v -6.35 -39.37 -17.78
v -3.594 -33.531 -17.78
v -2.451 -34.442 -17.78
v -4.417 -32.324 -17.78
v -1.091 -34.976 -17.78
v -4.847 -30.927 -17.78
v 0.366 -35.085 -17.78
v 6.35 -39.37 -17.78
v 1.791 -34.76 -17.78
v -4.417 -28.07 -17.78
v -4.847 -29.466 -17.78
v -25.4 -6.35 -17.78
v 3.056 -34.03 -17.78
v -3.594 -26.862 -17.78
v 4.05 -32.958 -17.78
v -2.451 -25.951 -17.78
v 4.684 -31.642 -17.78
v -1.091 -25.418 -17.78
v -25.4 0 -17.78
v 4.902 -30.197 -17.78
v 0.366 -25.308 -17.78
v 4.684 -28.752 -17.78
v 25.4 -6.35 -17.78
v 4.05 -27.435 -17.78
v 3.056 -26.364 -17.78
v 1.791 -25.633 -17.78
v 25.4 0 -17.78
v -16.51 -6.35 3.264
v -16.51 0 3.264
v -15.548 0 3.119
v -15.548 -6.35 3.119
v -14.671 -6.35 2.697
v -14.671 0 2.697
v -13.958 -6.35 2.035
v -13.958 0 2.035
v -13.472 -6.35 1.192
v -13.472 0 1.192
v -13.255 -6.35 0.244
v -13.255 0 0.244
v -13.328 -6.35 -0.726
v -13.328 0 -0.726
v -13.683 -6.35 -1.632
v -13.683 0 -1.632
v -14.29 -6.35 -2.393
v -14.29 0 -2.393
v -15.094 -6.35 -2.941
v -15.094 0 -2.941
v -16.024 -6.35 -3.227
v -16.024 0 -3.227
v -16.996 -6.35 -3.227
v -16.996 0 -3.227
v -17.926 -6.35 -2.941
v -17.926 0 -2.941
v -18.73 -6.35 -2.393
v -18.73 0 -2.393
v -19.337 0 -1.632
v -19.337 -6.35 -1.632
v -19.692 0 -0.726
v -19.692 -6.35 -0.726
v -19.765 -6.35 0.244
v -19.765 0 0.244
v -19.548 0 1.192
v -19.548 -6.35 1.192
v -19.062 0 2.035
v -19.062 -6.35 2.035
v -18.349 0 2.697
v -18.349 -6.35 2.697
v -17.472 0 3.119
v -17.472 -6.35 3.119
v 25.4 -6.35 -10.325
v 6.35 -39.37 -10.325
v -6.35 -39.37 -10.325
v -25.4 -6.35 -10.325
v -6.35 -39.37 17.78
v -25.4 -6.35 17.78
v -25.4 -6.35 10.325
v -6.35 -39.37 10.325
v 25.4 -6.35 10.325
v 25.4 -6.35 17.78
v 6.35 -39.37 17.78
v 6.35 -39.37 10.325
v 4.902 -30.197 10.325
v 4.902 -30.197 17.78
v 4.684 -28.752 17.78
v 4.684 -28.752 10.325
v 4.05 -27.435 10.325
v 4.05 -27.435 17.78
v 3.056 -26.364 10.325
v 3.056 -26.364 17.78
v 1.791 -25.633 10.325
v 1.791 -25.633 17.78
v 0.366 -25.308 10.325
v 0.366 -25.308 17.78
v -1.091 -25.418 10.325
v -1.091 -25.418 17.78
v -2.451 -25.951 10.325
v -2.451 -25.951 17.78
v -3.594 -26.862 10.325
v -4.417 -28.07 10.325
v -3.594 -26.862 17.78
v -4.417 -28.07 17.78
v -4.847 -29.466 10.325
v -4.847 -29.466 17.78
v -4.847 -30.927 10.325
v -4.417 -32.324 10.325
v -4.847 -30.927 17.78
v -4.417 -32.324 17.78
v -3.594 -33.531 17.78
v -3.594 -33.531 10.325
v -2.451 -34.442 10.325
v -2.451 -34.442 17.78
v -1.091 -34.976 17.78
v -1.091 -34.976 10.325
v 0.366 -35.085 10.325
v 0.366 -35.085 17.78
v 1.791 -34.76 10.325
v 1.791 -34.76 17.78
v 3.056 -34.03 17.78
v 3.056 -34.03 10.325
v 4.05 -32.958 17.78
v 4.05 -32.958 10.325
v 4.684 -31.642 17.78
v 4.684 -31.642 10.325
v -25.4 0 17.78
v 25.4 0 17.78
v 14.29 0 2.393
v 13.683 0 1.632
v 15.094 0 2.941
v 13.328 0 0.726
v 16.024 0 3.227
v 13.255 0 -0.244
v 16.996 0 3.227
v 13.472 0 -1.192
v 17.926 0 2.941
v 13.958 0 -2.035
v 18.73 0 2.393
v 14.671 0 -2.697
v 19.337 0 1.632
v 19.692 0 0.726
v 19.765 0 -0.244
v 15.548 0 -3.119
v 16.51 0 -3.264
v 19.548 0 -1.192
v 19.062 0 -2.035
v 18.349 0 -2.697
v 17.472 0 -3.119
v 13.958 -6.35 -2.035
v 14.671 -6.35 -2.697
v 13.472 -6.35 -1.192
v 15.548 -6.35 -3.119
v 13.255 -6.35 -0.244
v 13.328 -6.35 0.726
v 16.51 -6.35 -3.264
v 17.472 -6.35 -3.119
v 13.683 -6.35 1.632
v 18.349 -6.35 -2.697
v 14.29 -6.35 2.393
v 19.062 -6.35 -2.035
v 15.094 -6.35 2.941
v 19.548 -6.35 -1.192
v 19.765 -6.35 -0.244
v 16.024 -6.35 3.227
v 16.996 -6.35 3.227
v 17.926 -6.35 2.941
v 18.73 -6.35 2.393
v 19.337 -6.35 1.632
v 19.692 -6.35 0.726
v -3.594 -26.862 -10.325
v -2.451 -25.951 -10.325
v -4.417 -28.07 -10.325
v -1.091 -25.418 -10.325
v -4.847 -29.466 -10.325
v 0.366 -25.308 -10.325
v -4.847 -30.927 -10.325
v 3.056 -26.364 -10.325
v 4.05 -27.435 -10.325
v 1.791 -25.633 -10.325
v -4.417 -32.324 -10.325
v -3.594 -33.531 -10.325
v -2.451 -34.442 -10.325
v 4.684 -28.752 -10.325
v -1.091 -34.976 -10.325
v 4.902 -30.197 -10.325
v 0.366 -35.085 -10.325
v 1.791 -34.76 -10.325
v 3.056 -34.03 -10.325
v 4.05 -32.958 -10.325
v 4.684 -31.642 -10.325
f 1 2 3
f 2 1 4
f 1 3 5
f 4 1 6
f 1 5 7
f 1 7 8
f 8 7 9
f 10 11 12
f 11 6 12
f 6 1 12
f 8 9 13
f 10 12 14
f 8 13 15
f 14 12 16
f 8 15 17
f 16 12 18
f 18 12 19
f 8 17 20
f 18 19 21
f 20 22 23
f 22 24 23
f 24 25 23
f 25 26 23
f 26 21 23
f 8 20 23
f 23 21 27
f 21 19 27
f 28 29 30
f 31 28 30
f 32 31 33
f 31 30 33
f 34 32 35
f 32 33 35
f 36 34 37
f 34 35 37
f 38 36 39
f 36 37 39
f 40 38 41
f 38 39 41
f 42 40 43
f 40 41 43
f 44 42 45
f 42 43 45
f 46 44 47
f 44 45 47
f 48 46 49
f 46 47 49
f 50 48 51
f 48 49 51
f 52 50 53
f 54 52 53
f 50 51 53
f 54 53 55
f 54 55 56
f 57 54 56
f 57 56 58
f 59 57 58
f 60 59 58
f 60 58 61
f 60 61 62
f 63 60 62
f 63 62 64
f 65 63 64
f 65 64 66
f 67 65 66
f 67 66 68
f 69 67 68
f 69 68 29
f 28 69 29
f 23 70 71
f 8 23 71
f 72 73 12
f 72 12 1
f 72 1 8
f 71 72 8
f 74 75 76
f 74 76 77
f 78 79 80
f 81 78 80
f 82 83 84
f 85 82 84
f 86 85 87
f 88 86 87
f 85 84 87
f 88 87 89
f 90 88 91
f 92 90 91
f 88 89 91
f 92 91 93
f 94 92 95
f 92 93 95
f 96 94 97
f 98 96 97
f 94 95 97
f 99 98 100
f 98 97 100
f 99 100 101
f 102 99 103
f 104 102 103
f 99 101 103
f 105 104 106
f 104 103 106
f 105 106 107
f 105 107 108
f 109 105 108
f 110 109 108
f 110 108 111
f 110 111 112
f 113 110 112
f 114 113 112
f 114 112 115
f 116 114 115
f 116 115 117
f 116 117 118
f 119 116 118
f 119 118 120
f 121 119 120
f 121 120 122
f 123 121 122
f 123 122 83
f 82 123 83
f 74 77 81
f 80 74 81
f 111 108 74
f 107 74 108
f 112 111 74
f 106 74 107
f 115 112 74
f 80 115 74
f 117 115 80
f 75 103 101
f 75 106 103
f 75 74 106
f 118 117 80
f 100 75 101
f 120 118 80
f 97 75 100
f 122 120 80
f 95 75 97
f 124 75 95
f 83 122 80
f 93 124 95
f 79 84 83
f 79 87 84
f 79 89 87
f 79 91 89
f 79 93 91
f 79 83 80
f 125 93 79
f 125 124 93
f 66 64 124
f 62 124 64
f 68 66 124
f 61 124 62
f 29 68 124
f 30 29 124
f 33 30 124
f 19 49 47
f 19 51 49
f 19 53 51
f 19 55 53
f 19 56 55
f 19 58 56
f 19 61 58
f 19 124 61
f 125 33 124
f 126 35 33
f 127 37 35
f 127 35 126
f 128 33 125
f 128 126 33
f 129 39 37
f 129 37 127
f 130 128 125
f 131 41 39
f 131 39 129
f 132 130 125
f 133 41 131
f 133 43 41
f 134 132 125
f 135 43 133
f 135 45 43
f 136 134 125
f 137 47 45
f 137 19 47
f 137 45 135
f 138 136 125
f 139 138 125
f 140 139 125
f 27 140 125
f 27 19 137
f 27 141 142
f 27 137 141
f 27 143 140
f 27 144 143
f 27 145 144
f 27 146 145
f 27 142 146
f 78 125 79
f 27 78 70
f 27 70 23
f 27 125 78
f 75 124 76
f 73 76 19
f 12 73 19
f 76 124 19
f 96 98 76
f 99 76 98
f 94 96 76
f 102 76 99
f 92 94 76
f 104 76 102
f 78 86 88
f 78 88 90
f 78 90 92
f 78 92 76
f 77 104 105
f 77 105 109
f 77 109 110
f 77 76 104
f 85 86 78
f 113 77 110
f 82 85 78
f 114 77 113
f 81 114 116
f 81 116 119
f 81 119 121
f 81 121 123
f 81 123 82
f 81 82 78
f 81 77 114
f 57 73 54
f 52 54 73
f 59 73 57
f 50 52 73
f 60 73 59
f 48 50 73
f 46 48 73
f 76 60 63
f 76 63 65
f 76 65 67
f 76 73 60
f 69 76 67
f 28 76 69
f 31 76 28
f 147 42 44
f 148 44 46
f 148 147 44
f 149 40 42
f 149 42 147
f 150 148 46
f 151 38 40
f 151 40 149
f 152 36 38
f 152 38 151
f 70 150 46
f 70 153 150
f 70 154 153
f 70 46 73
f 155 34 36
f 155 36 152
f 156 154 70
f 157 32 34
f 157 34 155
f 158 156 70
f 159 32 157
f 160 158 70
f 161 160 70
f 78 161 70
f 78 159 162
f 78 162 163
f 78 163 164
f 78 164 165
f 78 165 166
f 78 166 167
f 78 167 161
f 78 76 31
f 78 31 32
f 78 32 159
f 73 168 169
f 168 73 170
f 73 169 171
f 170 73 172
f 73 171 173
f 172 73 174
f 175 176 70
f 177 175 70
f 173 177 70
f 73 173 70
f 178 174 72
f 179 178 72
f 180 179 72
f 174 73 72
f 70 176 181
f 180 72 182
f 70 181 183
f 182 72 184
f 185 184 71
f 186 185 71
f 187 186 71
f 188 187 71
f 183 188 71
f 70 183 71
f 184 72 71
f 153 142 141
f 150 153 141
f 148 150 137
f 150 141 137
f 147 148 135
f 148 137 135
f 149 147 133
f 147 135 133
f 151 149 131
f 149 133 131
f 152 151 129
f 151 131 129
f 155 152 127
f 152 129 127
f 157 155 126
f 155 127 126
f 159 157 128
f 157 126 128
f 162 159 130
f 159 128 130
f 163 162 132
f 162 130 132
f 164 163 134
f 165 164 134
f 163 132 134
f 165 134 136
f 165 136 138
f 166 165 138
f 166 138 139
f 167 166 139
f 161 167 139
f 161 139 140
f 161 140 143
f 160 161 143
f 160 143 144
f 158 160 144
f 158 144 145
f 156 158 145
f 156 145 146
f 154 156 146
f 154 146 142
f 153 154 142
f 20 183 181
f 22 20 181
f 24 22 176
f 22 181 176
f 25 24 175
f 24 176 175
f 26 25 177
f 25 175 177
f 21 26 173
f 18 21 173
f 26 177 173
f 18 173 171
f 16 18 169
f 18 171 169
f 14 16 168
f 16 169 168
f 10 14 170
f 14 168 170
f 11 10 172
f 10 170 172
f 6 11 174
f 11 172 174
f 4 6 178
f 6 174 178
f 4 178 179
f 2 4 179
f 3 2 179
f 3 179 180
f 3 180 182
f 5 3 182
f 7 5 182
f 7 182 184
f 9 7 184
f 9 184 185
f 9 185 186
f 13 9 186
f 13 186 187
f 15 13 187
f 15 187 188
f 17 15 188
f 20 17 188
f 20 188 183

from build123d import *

# Parameters (mm, degrees)
SKETCH2_W           = 50.8
SKETCH2_H           = 35.56
SKETCH2_R           = 3.2639
BOSS_EXTRUDE1_DEPTH = 39.37
SKETCH4_R           = 4.9022
CUT_EXTRUDE1_DEPTH  = 59.818963779
SKETCH5_W           = 50.8
SKETCH5_H           = 20.6502
CUT_EXTRUDE2_DEPTH  = 33.02


with BuildPart() as part:
    # Sketch2 → Boss-Extrude1 (new body)
    with BuildSketch(Plane(origin=(0, 0, 0), x_dir=(1, 0, 0), z_dir=(0, 1, 0))):
        Rectangle(SKETCH2_W, SKETCH2_H)
        with Locations(Location((-16.51, 0, 0), (0, 0, 270))):
            Circle(SKETCH2_R, mode=Mode.SUBTRACT)
        with Locations(Location((16.51, 0, 0), (0, 0, 90))):
            Circle(SKETCH2_R, mode=Mode.SUBTRACT)
    extrude(amount=-BOSS_EXTRUDE1_DEPTH)

    # Sketch4 → Cut-Extrude1 (cut, through all)
    with BuildSketch(Plane.XY.offset(17.78)):
        with Locations((0, -30.196811844)):
            Circle(SKETCH4_R)
        Polygon((-25.4, -6.35), (-6.35, -39.37), (-25.4, -39.37), align=None)
        Polygon((6.35, -39.37), (25.4, -39.37), (25.4, -6.35), align=None)
    extrude(amount=-CUT_EXTRUDE1_DEPTH, mode=Mode.SUBTRACT)

    # Sketch5 → Cut-Extrude2 (cut)
    with BuildSketch(Plane.XZ.offset(39.37)):
        Rectangle(SKETCH5_W, SKETCH5_H)
    extrude(amount=-CUT_EXTRUDE2_DEPTH, mode=Mode.SUBTRACT)


solid = part.part
